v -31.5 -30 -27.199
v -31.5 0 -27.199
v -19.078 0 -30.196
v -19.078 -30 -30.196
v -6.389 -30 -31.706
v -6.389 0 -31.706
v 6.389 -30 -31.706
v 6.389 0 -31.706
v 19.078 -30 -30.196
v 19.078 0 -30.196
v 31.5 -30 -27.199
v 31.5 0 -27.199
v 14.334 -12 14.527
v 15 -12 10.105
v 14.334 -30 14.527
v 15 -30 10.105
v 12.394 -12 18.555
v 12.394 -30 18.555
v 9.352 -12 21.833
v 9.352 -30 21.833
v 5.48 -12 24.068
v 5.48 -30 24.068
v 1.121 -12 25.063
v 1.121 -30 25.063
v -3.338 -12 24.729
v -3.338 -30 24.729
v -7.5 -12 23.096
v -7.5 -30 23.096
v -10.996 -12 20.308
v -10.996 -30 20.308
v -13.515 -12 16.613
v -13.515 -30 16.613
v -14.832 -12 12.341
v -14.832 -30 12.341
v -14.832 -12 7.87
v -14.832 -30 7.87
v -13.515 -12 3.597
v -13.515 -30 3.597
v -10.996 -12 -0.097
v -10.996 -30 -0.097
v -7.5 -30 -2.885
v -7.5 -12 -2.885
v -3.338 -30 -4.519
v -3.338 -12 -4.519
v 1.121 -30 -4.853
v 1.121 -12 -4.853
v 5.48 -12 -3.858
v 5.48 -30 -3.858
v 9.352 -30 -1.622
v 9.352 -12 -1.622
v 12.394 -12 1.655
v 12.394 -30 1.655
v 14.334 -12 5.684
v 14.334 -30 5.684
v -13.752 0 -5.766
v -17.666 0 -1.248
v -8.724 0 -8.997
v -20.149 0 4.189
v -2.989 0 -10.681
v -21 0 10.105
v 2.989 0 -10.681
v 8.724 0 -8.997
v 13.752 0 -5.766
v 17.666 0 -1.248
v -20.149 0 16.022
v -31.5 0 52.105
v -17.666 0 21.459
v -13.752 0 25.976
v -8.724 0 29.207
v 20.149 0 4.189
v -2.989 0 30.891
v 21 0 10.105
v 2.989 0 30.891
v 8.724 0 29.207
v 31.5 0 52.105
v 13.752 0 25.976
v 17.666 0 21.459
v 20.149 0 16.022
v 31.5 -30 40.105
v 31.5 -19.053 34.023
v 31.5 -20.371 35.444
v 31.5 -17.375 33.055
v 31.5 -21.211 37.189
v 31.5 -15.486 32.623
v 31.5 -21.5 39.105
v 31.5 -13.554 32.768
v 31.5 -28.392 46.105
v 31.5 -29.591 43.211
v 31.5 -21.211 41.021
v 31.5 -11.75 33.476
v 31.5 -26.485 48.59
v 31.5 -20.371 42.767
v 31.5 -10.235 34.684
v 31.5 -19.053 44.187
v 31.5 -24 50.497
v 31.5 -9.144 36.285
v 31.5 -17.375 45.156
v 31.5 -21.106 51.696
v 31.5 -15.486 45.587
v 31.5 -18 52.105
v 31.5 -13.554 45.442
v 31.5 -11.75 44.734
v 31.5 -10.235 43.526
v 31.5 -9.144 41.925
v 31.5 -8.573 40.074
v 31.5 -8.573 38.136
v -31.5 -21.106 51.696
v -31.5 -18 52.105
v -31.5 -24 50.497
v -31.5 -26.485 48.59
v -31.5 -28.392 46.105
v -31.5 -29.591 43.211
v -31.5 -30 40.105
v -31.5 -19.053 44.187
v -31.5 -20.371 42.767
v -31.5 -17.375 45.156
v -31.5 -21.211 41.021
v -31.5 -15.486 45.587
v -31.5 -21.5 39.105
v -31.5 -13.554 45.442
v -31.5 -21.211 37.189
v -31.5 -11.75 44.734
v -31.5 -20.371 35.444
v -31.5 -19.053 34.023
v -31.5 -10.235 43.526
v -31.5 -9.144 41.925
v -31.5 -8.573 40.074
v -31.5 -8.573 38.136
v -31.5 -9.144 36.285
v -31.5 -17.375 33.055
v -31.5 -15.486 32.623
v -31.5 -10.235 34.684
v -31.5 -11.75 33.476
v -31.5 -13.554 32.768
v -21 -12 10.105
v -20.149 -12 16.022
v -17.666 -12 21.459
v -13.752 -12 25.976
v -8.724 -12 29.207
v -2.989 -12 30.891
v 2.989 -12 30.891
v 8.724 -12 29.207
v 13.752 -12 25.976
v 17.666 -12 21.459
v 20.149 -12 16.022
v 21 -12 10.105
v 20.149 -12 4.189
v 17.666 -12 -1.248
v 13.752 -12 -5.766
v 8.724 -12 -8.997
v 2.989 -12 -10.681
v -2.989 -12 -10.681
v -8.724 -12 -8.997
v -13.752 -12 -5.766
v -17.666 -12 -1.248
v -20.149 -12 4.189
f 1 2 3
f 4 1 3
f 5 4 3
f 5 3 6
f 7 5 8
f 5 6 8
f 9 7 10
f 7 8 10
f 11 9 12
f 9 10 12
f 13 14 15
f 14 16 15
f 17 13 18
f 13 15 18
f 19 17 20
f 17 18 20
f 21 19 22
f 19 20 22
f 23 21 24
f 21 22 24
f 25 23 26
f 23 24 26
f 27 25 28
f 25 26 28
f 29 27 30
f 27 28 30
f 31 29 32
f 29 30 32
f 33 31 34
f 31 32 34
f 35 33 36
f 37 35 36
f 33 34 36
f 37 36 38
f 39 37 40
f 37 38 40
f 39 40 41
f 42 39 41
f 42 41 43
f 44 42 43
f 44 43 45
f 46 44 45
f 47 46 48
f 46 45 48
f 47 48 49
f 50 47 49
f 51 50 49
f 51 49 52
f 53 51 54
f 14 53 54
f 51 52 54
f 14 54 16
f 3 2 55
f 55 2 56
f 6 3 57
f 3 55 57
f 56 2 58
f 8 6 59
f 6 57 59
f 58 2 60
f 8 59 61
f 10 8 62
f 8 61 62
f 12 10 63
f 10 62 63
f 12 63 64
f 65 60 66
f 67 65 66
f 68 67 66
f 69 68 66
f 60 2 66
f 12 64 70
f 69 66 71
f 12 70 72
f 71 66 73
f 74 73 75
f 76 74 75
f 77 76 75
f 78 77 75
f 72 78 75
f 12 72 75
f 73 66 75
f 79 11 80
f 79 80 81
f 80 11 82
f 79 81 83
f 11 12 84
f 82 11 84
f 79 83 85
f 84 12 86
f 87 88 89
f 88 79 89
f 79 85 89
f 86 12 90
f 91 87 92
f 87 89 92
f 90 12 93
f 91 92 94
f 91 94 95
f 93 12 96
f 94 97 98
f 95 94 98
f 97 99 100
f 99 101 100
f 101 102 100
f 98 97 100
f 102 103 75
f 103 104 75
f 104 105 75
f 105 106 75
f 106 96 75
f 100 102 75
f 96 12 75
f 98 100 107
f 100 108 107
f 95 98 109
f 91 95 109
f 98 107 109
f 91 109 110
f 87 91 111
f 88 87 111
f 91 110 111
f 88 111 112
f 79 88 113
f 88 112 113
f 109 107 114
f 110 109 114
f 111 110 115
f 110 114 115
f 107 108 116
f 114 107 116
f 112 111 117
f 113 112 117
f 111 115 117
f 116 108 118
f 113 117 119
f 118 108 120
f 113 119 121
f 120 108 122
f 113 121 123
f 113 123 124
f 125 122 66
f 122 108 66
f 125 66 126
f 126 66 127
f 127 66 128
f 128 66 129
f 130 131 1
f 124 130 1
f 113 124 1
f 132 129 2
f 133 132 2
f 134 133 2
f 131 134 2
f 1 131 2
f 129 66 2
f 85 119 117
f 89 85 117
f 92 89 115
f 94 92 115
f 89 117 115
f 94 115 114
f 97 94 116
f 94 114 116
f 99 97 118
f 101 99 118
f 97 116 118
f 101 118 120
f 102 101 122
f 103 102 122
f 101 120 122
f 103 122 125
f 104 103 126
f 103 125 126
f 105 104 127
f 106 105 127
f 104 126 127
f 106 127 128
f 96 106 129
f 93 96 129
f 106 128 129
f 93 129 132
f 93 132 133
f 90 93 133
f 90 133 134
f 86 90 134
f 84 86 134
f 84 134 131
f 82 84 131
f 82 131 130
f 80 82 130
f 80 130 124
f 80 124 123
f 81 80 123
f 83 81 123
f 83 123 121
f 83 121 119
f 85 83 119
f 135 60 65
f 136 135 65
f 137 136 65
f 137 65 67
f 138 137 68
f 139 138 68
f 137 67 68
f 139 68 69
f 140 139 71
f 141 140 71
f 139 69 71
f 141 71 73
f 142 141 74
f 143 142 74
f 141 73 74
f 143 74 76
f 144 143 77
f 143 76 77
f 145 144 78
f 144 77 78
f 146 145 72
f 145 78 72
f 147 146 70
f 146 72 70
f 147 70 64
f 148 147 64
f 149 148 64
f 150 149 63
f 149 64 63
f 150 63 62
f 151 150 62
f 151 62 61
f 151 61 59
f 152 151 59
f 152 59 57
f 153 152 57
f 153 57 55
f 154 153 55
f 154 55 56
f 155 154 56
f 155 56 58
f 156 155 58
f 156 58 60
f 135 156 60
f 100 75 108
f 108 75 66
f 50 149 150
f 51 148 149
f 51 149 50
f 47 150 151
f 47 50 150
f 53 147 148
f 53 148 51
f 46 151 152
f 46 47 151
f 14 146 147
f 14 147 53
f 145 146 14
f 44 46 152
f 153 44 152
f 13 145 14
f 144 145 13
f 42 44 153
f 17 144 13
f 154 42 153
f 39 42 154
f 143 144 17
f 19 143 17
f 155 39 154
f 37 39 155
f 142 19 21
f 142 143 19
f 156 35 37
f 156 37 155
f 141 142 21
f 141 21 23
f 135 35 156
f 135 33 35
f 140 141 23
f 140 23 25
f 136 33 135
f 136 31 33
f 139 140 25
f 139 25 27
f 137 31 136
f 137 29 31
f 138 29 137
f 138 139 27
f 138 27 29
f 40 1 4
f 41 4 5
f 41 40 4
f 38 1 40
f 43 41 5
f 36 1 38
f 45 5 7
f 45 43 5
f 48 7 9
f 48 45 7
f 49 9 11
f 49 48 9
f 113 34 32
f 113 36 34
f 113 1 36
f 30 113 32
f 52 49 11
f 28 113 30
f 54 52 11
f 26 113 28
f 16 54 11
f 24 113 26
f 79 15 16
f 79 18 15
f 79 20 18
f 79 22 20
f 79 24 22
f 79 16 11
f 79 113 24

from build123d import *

# Parameters (mm, degrees)
F1_DEPTH       = 30
F3_D           = 30
F3_CBORE_D     = 42
F3_CBORE_DEPTH = 12
F5_R           = 12
F6_D           = 13


with BuildPart() as f1:
    # F0 (on Front) → F1 (new body)
    with BuildSketch(Plane.XZ):
        with BuildLine():
            Line((31.5, 52.105192), (-31.5, 52.105192))
            Line((-31.5, 52.105192), (-31.5, -27.19897))
            ThreePointArc((-31.5, -27.19897), (0, -31.894808), (31.5, -27.19897))
            Line((31.5, -27.19897), (31.5, 52.105192))
        make_face()
    extrude(amount=F1_DEPTH)

    # F3 (through all)
    with Locations(Plane(origin=(0, 0, 0), x_dir=(-1, 0, 0), z_dir=(0, 1, 0))):
        with Locations((0, 10.105192)):
            CounterBoreHole(F3_D / 2, F3_CBORE_D / 2, F3_CBORE_DEPTH)

    # F5
    f5_edges = [f1.edges().sort_by_distance(p)[0] for p in [
        (0, -30, 52.105192),
    ]]
    fillet(f5_edges, radius=F5_R)

    # F6 (through all)
    with Locations(Plane.YZ.offset(31.5)):
        with Locations((-15, 39.105192)):
            Hole(F6_D / 2)


solid = f1.part
